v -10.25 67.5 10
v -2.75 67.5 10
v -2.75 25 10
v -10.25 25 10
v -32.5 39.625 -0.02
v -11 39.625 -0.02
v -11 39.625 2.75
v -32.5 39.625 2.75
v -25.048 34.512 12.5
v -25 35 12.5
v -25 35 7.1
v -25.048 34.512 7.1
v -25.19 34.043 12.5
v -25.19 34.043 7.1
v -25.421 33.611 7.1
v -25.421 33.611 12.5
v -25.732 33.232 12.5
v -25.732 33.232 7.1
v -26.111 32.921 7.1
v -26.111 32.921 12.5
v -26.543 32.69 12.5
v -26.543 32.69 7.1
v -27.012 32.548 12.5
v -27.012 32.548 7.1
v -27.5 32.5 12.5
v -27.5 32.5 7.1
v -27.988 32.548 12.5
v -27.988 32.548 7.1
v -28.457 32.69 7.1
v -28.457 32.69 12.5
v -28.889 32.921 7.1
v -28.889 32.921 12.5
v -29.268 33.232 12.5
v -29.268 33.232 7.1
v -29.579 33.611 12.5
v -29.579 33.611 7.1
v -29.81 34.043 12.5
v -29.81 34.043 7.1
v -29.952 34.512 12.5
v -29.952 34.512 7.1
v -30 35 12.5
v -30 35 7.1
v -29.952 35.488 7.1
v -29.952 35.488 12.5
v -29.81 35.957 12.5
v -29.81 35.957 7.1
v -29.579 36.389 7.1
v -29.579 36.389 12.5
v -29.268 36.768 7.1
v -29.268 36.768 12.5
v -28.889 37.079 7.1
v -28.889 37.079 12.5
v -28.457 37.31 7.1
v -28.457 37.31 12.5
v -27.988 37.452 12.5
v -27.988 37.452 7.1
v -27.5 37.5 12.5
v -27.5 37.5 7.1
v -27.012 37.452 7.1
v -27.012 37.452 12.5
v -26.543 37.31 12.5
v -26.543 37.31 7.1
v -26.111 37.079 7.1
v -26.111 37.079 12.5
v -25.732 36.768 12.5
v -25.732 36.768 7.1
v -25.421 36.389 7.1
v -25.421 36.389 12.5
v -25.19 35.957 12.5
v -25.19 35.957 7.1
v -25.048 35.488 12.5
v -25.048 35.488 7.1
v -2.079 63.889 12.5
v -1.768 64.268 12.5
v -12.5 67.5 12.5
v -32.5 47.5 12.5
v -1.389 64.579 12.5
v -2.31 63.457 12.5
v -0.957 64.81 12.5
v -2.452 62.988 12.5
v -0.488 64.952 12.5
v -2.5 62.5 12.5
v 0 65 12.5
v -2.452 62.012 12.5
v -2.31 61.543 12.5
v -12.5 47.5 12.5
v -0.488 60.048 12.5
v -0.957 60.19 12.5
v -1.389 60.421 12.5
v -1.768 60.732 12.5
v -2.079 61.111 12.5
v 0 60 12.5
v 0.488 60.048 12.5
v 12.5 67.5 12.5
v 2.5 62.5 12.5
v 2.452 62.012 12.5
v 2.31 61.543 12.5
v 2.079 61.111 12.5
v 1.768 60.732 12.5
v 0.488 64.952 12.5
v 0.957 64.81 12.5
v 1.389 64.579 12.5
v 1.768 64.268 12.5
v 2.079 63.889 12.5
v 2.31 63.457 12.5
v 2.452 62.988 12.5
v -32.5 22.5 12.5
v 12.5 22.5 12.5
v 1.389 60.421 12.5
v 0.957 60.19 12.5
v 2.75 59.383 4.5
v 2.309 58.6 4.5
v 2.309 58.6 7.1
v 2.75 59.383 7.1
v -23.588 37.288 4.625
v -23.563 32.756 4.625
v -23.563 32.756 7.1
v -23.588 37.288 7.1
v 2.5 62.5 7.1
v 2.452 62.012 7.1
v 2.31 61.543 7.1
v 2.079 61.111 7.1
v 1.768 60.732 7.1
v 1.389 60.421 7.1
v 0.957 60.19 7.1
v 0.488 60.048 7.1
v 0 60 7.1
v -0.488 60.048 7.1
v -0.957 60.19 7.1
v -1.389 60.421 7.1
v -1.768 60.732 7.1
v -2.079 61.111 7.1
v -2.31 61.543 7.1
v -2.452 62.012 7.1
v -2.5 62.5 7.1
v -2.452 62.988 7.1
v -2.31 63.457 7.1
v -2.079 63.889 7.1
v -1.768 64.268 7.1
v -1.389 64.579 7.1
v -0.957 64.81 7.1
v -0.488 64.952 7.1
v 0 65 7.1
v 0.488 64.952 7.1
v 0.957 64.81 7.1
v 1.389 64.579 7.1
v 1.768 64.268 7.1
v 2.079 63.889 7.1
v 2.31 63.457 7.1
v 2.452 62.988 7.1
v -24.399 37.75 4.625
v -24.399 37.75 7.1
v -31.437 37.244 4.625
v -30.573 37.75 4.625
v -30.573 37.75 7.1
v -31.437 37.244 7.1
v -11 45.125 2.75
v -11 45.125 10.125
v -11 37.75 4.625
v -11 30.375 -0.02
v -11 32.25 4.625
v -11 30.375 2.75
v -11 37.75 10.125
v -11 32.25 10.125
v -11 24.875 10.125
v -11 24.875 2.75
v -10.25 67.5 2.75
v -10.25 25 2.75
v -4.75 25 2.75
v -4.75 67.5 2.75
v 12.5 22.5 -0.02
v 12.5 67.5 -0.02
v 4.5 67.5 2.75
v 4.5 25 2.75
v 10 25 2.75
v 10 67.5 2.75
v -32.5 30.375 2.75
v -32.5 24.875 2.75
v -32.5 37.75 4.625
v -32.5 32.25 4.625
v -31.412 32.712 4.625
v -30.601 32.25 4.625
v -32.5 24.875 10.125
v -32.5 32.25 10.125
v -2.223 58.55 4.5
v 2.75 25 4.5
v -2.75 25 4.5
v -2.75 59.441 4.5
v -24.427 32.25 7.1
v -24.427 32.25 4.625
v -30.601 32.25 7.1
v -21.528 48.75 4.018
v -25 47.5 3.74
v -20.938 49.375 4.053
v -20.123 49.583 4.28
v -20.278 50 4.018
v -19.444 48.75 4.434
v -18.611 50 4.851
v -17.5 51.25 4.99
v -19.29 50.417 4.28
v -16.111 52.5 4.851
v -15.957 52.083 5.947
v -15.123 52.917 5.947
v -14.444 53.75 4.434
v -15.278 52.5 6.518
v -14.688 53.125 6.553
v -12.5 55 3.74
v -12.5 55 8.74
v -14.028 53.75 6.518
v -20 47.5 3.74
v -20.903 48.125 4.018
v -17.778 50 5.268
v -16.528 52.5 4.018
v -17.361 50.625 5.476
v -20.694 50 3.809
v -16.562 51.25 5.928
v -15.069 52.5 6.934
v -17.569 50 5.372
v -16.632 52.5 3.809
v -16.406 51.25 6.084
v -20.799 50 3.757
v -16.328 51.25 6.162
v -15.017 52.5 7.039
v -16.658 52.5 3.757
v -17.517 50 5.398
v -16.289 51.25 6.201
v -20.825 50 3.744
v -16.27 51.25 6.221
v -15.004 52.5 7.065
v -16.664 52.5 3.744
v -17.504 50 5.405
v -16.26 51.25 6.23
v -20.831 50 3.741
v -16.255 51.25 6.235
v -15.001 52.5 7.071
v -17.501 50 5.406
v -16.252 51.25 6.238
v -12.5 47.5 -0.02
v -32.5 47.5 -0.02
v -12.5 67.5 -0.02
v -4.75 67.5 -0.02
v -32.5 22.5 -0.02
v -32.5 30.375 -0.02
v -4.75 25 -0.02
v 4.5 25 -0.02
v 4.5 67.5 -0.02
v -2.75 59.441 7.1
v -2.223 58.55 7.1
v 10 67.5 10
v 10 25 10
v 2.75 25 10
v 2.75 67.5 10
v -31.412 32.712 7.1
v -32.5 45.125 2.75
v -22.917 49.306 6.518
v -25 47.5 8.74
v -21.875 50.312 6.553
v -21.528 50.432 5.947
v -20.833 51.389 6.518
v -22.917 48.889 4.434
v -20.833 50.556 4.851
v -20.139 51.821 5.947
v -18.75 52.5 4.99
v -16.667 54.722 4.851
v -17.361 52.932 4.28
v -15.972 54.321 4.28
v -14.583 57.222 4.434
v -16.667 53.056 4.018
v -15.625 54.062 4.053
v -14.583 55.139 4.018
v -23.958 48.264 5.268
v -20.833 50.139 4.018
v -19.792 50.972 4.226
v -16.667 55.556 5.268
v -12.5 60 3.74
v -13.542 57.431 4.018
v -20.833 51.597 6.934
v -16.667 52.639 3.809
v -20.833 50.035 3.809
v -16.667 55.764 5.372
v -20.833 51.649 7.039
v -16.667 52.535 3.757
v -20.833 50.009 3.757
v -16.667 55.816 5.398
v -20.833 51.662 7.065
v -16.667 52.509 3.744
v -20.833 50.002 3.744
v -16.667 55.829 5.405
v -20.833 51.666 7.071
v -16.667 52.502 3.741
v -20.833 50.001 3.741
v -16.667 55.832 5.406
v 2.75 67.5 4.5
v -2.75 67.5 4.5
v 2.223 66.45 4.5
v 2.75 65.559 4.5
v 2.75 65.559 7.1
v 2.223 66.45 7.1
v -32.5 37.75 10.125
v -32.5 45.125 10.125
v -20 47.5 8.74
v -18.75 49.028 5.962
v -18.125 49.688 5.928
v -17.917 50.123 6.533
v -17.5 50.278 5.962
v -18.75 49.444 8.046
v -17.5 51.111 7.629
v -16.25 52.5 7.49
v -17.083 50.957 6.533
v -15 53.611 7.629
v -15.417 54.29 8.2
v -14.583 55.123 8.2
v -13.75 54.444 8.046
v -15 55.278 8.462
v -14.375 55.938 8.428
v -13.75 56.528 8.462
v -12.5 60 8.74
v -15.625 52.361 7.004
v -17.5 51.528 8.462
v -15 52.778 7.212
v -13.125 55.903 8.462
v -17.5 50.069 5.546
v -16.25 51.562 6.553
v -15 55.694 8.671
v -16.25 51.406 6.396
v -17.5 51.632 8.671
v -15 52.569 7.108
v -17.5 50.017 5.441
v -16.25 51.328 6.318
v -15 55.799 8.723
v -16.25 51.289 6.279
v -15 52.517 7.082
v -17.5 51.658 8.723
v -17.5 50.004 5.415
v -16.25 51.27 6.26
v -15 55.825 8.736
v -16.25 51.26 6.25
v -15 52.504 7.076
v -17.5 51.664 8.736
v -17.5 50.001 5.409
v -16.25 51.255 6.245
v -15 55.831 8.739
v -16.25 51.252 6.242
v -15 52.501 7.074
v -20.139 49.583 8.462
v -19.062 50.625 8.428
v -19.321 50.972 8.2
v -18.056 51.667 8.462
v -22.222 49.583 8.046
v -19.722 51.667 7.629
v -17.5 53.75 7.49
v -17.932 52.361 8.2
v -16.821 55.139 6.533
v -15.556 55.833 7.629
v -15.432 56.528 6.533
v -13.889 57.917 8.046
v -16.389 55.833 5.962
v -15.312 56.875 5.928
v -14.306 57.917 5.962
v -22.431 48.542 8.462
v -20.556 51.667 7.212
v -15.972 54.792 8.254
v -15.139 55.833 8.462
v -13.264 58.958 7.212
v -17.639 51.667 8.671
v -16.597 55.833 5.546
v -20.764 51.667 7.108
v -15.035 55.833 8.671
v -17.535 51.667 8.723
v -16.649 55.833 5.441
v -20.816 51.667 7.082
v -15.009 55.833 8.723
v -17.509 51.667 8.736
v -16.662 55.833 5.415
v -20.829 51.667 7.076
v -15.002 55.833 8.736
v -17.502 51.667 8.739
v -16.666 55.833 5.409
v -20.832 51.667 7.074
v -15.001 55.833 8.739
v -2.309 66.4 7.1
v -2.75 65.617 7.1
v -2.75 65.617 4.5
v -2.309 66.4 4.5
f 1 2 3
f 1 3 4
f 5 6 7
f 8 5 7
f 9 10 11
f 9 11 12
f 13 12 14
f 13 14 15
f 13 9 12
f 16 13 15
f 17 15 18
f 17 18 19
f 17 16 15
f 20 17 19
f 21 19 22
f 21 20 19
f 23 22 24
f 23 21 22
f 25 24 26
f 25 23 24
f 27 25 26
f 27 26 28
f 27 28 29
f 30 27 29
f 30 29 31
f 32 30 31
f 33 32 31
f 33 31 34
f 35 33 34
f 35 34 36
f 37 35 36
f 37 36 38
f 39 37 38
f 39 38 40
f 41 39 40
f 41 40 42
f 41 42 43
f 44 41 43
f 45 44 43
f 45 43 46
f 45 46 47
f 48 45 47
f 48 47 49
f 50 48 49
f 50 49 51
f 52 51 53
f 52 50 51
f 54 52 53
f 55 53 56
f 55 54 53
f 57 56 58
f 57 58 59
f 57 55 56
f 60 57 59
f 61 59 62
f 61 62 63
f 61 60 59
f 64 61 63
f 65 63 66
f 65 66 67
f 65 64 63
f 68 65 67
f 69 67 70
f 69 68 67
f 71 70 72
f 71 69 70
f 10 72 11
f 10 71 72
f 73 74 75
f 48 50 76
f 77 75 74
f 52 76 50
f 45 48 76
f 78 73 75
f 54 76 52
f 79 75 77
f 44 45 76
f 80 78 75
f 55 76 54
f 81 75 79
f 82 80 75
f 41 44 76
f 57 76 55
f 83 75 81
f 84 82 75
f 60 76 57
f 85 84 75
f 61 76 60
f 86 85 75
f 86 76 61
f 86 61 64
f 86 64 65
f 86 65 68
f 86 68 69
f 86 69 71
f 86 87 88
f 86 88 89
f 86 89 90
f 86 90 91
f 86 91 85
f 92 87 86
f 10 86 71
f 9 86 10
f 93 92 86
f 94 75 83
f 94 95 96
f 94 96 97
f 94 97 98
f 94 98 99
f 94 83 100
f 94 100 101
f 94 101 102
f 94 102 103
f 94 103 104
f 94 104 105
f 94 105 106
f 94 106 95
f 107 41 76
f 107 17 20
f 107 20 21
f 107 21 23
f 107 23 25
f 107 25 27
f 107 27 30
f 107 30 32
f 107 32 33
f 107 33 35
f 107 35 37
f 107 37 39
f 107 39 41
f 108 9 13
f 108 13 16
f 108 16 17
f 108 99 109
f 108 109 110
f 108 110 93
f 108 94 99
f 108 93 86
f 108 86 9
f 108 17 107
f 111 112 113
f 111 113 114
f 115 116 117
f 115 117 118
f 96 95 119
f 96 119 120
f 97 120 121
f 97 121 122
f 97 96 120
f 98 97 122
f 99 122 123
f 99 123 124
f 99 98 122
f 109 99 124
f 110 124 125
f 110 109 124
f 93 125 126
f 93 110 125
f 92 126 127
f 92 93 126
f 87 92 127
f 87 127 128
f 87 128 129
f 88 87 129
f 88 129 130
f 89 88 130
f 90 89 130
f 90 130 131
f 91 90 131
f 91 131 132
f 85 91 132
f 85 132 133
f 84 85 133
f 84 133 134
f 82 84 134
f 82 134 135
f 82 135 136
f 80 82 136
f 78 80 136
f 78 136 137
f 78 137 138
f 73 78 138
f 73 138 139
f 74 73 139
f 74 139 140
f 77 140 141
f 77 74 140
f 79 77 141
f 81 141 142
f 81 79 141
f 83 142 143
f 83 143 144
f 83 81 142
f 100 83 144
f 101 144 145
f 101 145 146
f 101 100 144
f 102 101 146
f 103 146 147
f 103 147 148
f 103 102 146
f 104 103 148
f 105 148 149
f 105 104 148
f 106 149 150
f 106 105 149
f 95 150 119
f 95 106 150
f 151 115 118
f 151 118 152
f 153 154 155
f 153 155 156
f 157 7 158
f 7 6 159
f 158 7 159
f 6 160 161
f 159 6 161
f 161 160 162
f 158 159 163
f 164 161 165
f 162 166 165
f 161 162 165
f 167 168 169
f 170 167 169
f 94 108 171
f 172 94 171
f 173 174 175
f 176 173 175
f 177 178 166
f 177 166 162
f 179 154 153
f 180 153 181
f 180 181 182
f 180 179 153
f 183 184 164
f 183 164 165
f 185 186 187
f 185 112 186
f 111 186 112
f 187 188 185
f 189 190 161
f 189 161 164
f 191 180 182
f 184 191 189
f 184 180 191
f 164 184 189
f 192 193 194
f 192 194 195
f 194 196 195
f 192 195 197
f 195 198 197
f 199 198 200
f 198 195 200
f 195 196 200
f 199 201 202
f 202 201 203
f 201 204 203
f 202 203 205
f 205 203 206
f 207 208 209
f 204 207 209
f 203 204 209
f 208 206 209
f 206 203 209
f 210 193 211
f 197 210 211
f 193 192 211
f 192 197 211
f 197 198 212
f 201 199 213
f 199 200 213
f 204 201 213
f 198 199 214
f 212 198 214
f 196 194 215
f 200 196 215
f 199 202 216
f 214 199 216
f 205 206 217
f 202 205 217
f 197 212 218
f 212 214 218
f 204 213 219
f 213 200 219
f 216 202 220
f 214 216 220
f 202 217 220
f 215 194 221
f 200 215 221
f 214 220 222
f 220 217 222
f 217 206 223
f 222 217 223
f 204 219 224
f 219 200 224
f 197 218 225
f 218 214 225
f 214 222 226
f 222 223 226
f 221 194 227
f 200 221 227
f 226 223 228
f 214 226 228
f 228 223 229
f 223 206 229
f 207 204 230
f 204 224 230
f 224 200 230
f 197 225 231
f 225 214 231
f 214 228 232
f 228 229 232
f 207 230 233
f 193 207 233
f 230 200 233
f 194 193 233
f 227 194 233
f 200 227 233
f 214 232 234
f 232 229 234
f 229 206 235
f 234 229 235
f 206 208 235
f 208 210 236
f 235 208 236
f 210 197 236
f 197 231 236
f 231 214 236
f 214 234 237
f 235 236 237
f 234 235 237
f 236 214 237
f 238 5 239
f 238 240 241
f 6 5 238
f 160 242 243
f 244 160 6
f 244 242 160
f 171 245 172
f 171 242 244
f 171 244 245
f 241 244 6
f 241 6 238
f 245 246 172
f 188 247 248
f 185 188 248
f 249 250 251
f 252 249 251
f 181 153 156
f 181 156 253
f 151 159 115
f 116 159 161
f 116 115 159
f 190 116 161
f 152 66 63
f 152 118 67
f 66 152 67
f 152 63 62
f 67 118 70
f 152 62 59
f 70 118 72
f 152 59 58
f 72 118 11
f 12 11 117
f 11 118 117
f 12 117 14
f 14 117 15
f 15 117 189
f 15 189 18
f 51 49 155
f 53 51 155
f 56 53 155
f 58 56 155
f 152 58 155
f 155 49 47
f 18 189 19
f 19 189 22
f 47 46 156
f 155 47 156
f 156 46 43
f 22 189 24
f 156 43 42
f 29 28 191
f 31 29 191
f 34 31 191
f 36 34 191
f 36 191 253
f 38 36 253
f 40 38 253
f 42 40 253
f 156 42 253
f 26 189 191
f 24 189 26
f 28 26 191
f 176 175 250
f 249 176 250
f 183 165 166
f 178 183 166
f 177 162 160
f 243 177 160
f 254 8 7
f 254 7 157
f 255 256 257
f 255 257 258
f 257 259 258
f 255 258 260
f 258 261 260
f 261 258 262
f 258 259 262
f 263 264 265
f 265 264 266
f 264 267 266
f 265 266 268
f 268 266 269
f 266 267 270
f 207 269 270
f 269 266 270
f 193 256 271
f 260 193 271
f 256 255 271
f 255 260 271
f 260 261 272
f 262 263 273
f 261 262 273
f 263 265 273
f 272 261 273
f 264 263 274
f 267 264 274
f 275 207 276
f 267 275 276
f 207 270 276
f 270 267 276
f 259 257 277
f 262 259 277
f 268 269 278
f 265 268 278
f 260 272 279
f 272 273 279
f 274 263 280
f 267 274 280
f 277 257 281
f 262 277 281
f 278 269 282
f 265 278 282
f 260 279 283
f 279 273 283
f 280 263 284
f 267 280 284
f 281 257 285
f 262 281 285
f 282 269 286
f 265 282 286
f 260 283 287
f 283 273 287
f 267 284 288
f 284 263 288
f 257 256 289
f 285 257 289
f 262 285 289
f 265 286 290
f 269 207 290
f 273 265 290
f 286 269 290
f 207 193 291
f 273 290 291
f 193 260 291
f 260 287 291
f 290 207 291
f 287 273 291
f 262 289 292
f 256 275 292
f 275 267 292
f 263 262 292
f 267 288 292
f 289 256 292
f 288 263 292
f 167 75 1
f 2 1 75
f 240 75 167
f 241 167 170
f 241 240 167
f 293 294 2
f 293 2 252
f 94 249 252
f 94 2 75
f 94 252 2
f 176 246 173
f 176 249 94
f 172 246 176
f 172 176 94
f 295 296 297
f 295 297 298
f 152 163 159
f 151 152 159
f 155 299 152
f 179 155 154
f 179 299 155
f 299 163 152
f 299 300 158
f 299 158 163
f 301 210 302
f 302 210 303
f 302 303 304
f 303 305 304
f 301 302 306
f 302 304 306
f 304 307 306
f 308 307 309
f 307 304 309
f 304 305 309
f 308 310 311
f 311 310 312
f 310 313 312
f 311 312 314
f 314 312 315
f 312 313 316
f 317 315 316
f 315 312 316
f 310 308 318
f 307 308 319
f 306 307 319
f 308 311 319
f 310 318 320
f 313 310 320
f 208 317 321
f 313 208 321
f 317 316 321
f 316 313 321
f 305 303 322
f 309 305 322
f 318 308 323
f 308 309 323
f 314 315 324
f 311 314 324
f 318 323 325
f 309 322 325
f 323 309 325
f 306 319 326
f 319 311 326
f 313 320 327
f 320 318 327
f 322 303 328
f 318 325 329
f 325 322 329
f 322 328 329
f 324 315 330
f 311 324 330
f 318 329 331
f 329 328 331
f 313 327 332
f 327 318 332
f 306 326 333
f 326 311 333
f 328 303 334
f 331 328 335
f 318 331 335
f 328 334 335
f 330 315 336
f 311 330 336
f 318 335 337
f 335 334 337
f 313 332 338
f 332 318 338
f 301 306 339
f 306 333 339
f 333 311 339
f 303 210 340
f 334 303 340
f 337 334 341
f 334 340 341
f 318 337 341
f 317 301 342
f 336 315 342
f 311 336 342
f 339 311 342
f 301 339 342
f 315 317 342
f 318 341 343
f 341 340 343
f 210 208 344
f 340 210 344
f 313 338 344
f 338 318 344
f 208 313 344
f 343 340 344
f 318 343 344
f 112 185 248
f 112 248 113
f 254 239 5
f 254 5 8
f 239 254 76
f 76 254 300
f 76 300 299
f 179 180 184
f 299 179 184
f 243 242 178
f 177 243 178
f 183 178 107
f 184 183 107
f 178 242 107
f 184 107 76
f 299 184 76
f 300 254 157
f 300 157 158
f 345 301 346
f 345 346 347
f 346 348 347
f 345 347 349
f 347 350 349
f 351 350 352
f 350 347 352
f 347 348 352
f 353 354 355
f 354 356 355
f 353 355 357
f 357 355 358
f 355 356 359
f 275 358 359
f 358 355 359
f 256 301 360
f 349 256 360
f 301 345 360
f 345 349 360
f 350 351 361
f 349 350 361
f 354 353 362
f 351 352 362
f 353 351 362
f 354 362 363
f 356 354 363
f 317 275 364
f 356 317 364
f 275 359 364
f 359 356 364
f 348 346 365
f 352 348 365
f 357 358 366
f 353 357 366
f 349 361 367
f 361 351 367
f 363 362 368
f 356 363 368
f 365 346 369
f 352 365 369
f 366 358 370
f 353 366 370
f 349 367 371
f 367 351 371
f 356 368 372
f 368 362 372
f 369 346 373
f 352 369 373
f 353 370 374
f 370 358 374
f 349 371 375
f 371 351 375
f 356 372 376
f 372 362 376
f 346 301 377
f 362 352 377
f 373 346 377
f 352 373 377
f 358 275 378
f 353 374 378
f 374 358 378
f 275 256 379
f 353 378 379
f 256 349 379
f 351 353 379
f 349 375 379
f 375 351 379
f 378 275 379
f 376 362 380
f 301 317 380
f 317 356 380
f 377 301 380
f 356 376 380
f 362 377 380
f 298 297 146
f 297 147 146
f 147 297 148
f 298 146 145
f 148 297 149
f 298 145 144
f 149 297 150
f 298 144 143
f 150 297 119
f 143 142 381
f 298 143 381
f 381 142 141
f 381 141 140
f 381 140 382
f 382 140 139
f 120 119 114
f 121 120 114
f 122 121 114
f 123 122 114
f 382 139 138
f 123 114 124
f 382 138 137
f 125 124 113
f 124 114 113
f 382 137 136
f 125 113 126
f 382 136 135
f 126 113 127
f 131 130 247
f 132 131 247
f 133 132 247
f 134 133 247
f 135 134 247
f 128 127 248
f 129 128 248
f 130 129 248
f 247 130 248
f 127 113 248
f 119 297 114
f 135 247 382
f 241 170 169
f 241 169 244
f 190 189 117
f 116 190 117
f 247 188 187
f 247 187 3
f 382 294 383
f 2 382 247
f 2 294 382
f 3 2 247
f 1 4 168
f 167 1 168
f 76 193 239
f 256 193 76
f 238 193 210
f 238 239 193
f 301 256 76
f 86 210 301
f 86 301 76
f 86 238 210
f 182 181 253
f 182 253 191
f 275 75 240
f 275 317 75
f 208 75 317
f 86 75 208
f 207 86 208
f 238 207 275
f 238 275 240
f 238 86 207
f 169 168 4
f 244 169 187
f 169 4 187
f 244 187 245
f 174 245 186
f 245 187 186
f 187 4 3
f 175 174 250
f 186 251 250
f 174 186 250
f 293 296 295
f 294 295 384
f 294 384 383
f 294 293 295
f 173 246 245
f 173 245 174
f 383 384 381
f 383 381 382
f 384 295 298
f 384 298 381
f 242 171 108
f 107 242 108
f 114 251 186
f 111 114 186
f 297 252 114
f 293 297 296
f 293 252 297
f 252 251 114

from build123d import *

# Parameters (mm, degrees)
SKETCH1_W           = 25
SKETCH1_H           = 25
BOSS_EXTRUDE1_DEPTH = 22.5
SKETCH4_W           = 25
SKETCH4_H           = 25
BOSS_EXTRUDE2_DEPTH = 20
CUT_EXTRUDE2_DEPTH  = 42.5
CUT_EXTRUDE3_DEPTH  = 21.5
SKETCH6_R           = 2.25
CUT_EXTRUDE4_DEPTH  = 10
SKETCH10_R          = 2.5
CUT_EXTRUDE7_DEPTH  = 10
CUT_EXTRUDE8_DEPTH  = 2.6
SKETCH8_W           = 45
SKETCH8_H           = 12.480087705
CUT_EXTRUDE9_DEPTH  = 50


with BuildPart() as part:
    # Sketch1 → Boss-Extrude1 (new, symmetric)
    with BuildSketch(Plane(origin=(0, 0, 0), x_dir=(1, 0, 0), z_dir=(0, 1, 0))):
        Rectangle(SKETCH1_W, SKETCH1_H)
    extrude(amount=BOSS_EXTRUDE1_DEPTH, both=True)

    # Sketch4 → Boss-Extrude2 (add)
    with BuildSketch(Plane.ZY.offset(12.5)):
        with Locations((0, 10)):
            Rectangle(SKETCH4_W, SKETCH4_H)
    extrude(amount=BOSS_EXTRUDE2_DEPTH)

    # Sketch3 → Cut-Extrude2 (cut)
    with BuildSketch(Plane.XZ.offset(22.5)):
        Polygon((-2.75, 4.5), (-2.75, 10), (-10.25, 10), (-10.25, 2.75), (-4.75, 2.75), (-4.75, -2.75), (-10.25, -2.75), (-10.25, -10.25), (-2.75, -10.25), (-2.75, -4.75), (2.75, -4.75), (2.75, -10.25), (10, -10.25), (10, -2.75), (4.5, -2.75), (4.5, 2.75), (10, 2.75), (10, 10), (2.75, 10), (2.75, 4.5), align=None)
    extrude(amount=-CUT_EXTRUDE2_DEPTH, mode=Mode.SUBTRACT)

    # Sketch5 → Cut-Extrude3 (cut)
    with BuildSketch(Plane.ZY.offset(32.5)):
        Polygon((-10.125, 7.25), (-10.125, -0.125), (-2.75, -0.125), (-2.75, 5.375), (2.75, 5.375), (2.75, -0.125), (10.125, -0.125), (10.125, 7.25), (4.625, 7.25), (4.625, 12.75), (10.125, 12.75), (10.125, 20.125), (2.75, 20.125), (2.75, 14.625), (-2.75, 14.625), (-2.75, 20.125), (-10.125, 20.125), (-10.125, 12.75), (-4.625, 12.75), (-4.625, 7.25), align=None)
    extrude(amount=-CUT_EXTRUDE3_DEPTH, mode=Mode.SUBTRACT)

    # Sketch6 → Cut-Extrude4 (cut)
    with BuildSketch(Plane(origin=(0, 0, -12.5), x_dir=(-1, 0, 0), z_dir=(0, 0, -1))):
        with Locations((0, -12.5)):
            Circle(SKETCH6_R)
        with Locations((22.5, 10)):
            Circle(SKETCH6_R)
    extrude(amount=-CUT_EXTRUDE4_DEPTH, mode=Mode.SUBTRACT)

    # Sketch10 → Cut-Extrude7 (cut)
    with BuildSketch(Plane.XY.offset(12.5)):
        with Locations((-27.5, 10)):
            Circle(SKETCH10_R)
        with Locations((0, -17.5)):
            Circle(SKETCH10_R)
    extrude(amount=-CUT_EXTRUDE7_DEPTH, mode=Mode.SUBTRACT)

    # Sketch11 → Cut-Extrude8 (cut)
    with BuildSketch(Plane(origin=(0, 0, 4.5), x_dir=(-1, 0, 0), z_dir=(0, 0, -1))):
        Polygon((2.222626661, -13.550219745), (-2.309296709, -13.600258721), (-4.53192337, -17.550038976), (-2.222626661, -21.449780255), (2.309296709, -21.399741279), (4.53192337, -17.449961024), align=None)
        Polygon((31.412394942, 12.287793512), (27.474910171, 14.532130165), (23.562515229, 12.244336654), (23.587605058, 7.712206488), (27.525089829, 5.467869835), (31.437484771, 7.755663346), align=None)
    extrude(amount=-CUT_EXTRUDE8_DEPTH, mode=Mode.SUBTRACT)

    # Sketch8 → Cut-Extrude9 (cut)
    with BuildSketch(Plane(origin=(0, 22.5, 0), x_dir=(1, 0, 0), z_dir=(0, 1, 0))):
        with Locations((-10, 6.259956147)):
            Rectangle(SKETCH8_W, SKETCH8_H)
    extrude(amount=-CUT_EXTRUDE9_DEPTH, mode=Mode.SUBTRACT)

    # Loft1: read off the stored shape, not the designer's step
    # Loft1: loft between two sections, ruled curve by curve
    loft1_from = [
        Edge.make_bspline([(-20, -2.5, 8.740043853), (-20.833333333, -2.5, 8.740043853), (-21.666666667, -2.5, 8.740043853), (-23.333333333, -2.5, 8.740043853), (-24.166666667, -2.5, 8.740043853), (-25, -2.5, 8.740043853)], [0, 0, 0, 0, 0.5, 0.5, 1, 1, 1, 1], 3),
        Edge.make_bspline([(-25, -2.5, 8.740043853), (-25, -2.5, 7.906710519), (-25, -2.5, 7.073377186), (-25, -2.5, 5.406710519), (-25, -2.5, 4.573377186), (-25, -2.5, 3.740043853)], [0, 0, 0, 0, 0.5, 0.5, 1, 1, 1, 1], 3),
        Edge.make_bspline([(-20, -2.5, 3.740043853), (-20, -2.5, 4.573377186), (-20, -2.5, 5.406710519), (-20, -2.5, 7.073377186), (-20, -2.5, 7.906710519), (-20, -2.5, 8.740043853)], [0, 0, 0, 0, 0.5, 0.5, 1, 1, 1, 1], 3),
        Edge.make_bspline([(-25, -2.5, 3.740043853), (-24.166666667, -2.5, 3.740043853), (-23.333333333, -2.5, 3.740043853), (-21.666666667, -2.5, 3.740043853), (-20.833333333, -2.5, 3.740043853), (-20, -2.5, 3.740043853)], [0, 0, 0, 0, 0.5, 0.5, 1, 1, 1, 1], 3),
    ]
    loft1_to = [
        Edge.make_bspline([(-12.5, -15, 8.740043853), (-12.5, -15, 7.906710519), (-12.5, -15, 7.073377186), (-12.5, -15, 5.406710519), (-12.5, -15, 4.573377186), (-12.5, -15, 3.740043853)], [0, 0, 0, 0, 0.5, 0.5, 1, 1, 1, 1], 3),
        Edge.make_bspline([(-12.5, -15, 3.740043853), (-12.5, -14.166666667, 3.740043853), (-12.5, -13.333333333, 3.740043853), (-12.5, -11.666666667, 3.740043853), (-12.5, -10.833333333, 3.740043853), (-12.5, -10, 3.740043853)], [0, 0, 0, 0, 0.5, 0.5, 1, 1, 1, 1], 3),
        Edge.make_bspline([(-12.5, -10, 8.740043853), (-12.5, -10.833333333, 8.740043853), (-12.5, -11.666666667, 8.740043853), (-12.5, -13.333333333, 8.740043853), (-12.5, -14.166666667, 8.740043853), (-12.5, -15, 8.740043853)], [0, 0, 0, 0, 0.5, 0.5, 1, 1, 1, 1], 3),
        Edge.make_bspline([(-12.5, -10, 3.740043853), (-12.5, -10, 4.573377186), (-12.5, -10, 5.406710519), (-12.5, -10, 7.073377186), (-12.5, -10, 7.906710519), (-12.5, -10, 8.740043853)], [0, 0, 0, 0, 0.5, 0.5, 1, 1, 1, 1], 3),
    ]
    loft1 = Solid(Shell([*[Face.make_surface_from_curves(loft1_from[k], loft1_to[k]) for k in range(4)], Face(Wire(loft1_from)), Face(Wire(loft1_to))]))
    add(loft1)


with BuildPart() as body_2:
    # Mirror1: mirrored copy
    add(part.part.mirror(Plane(origin=(0, 22.5, 0), x_dir=(0, 0, 1), z_dir=(0, -1, 0))))


solid = body_2.part
